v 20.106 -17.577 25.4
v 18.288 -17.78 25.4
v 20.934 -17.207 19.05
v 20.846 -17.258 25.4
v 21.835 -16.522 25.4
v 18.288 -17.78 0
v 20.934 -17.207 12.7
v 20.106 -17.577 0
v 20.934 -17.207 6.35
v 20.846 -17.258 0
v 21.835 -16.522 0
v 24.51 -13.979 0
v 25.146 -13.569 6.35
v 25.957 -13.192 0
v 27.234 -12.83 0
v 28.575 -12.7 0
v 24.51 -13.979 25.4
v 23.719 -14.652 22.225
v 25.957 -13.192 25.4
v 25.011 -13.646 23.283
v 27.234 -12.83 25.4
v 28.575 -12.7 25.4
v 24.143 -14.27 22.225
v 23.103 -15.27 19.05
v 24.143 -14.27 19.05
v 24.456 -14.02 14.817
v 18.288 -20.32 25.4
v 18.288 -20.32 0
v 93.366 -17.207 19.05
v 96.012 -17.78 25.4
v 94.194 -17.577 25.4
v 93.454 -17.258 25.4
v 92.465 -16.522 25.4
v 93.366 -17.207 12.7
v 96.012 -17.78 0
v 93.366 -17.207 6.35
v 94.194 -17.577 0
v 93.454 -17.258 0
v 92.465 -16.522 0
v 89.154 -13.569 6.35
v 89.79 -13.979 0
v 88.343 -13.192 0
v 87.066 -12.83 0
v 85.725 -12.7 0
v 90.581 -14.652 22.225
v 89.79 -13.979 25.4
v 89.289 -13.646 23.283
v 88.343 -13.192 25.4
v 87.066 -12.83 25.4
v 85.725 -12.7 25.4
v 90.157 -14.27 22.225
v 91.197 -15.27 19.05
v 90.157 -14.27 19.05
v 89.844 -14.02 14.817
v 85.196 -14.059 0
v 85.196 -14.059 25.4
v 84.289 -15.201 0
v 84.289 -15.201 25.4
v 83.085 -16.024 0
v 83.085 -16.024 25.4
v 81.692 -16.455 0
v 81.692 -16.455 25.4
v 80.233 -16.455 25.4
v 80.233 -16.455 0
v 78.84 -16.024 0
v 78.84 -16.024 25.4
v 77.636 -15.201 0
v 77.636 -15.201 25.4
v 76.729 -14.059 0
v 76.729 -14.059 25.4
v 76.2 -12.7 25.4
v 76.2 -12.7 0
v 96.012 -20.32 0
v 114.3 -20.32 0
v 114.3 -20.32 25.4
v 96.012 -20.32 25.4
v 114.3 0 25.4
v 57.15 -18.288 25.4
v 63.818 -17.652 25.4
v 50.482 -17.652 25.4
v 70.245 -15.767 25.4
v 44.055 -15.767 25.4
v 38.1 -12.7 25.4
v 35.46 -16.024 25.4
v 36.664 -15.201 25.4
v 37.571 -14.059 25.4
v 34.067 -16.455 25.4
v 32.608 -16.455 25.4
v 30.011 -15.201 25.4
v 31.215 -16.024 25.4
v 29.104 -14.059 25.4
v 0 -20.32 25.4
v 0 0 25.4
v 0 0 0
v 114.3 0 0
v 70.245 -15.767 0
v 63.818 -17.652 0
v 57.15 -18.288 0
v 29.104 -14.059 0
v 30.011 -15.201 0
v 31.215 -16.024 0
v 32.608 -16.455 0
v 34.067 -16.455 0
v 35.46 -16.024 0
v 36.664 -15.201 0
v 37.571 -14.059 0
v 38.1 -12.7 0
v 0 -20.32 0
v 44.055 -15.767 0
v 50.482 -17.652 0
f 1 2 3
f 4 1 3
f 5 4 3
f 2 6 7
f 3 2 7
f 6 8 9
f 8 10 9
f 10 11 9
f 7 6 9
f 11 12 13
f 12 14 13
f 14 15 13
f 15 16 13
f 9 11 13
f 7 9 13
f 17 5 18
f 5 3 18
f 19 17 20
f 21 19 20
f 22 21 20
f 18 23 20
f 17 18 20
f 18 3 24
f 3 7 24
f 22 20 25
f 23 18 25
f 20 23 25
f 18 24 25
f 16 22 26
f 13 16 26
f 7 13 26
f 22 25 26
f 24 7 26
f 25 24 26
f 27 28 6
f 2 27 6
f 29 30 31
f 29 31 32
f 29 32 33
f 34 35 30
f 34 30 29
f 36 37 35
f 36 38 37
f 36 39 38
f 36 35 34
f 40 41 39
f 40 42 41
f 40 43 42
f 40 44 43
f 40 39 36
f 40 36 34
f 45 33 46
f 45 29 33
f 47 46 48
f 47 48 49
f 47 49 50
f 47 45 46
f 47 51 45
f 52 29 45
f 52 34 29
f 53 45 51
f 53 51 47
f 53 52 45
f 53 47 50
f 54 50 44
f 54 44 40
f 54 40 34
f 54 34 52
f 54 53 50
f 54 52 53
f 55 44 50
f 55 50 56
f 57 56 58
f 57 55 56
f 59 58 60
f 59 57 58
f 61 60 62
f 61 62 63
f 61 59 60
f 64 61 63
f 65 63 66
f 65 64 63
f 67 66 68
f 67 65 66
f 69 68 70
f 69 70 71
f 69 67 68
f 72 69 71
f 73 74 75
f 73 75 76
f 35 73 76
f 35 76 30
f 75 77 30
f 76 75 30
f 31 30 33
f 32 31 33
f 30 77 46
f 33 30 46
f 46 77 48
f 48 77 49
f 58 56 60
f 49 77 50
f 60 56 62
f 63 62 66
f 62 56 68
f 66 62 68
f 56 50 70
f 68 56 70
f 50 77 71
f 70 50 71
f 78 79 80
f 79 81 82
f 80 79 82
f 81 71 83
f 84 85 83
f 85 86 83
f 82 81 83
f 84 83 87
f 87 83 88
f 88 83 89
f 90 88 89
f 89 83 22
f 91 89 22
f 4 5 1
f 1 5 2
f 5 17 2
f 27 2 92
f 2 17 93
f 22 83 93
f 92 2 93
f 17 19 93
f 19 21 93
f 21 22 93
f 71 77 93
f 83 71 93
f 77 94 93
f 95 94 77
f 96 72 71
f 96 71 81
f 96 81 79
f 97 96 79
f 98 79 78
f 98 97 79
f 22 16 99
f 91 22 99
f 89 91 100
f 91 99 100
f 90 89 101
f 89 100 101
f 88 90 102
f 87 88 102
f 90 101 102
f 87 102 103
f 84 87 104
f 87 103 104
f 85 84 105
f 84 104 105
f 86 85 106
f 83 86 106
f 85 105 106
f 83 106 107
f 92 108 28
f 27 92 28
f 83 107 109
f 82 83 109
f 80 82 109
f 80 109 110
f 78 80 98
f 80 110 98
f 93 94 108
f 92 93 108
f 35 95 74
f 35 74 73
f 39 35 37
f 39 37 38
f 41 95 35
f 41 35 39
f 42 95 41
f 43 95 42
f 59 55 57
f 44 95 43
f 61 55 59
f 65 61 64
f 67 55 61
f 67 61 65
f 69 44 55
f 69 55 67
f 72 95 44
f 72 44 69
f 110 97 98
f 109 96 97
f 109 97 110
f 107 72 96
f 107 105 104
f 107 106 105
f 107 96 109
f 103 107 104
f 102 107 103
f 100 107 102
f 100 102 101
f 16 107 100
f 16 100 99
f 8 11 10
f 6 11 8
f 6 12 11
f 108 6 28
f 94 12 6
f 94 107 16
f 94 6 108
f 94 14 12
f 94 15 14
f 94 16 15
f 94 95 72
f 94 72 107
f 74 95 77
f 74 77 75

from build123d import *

# Parameters (mm, degrees)
F1_DEPTH = 25.4


with BuildPart() as f1:
    # F0 (on Top) → F1 (new body)
    with BuildSketch(Plane.XY):
        with BuildLine():
            Line((57.15, 0), (0, 0))
            Line((0, 0), (0, -20.32))
            Line((0, -20.32), (18.288, -20.32))
            Line((18.288, -20.32), (18.288, -17.78))
            add(Edge.make_bspline(
                [(18.288, -17.78), (19.5003372633, -17.78), (20.9589545485, -17.4917433662), (23.0646434791, -15.3048474183), (24.9900381466, -13.3300613523), (27.3662145743, -12.7), (28.575, -12.7)],
                knots=[0, 0, 0, 0, 0.2397485597, 0.4832453932, 0.7259444723, 1, 1, 1, 1], degree=3))
            ThreePointArc((28.575, -12.7), (33.3375, -16.51), (38.1, -12.7))
            ThreePointArc((38.1, -12.7), (47.2236683009, -16.8621762468), (57.15, -18.288))
            Line((57.15, -18.288), (57.15, 0))
        make_face()
    extrude(amount=F1_DEPTH)

    # F2: F1 across face


with BuildPart() as f1_1:
    add(f1.part)
    add(f1.part.mirror(Plane(origin=(57.15, -9.144, 12.7), x_dir=(0, 1, 0), z_dir=(1, 0, 0))))


solid = f1_1.part
